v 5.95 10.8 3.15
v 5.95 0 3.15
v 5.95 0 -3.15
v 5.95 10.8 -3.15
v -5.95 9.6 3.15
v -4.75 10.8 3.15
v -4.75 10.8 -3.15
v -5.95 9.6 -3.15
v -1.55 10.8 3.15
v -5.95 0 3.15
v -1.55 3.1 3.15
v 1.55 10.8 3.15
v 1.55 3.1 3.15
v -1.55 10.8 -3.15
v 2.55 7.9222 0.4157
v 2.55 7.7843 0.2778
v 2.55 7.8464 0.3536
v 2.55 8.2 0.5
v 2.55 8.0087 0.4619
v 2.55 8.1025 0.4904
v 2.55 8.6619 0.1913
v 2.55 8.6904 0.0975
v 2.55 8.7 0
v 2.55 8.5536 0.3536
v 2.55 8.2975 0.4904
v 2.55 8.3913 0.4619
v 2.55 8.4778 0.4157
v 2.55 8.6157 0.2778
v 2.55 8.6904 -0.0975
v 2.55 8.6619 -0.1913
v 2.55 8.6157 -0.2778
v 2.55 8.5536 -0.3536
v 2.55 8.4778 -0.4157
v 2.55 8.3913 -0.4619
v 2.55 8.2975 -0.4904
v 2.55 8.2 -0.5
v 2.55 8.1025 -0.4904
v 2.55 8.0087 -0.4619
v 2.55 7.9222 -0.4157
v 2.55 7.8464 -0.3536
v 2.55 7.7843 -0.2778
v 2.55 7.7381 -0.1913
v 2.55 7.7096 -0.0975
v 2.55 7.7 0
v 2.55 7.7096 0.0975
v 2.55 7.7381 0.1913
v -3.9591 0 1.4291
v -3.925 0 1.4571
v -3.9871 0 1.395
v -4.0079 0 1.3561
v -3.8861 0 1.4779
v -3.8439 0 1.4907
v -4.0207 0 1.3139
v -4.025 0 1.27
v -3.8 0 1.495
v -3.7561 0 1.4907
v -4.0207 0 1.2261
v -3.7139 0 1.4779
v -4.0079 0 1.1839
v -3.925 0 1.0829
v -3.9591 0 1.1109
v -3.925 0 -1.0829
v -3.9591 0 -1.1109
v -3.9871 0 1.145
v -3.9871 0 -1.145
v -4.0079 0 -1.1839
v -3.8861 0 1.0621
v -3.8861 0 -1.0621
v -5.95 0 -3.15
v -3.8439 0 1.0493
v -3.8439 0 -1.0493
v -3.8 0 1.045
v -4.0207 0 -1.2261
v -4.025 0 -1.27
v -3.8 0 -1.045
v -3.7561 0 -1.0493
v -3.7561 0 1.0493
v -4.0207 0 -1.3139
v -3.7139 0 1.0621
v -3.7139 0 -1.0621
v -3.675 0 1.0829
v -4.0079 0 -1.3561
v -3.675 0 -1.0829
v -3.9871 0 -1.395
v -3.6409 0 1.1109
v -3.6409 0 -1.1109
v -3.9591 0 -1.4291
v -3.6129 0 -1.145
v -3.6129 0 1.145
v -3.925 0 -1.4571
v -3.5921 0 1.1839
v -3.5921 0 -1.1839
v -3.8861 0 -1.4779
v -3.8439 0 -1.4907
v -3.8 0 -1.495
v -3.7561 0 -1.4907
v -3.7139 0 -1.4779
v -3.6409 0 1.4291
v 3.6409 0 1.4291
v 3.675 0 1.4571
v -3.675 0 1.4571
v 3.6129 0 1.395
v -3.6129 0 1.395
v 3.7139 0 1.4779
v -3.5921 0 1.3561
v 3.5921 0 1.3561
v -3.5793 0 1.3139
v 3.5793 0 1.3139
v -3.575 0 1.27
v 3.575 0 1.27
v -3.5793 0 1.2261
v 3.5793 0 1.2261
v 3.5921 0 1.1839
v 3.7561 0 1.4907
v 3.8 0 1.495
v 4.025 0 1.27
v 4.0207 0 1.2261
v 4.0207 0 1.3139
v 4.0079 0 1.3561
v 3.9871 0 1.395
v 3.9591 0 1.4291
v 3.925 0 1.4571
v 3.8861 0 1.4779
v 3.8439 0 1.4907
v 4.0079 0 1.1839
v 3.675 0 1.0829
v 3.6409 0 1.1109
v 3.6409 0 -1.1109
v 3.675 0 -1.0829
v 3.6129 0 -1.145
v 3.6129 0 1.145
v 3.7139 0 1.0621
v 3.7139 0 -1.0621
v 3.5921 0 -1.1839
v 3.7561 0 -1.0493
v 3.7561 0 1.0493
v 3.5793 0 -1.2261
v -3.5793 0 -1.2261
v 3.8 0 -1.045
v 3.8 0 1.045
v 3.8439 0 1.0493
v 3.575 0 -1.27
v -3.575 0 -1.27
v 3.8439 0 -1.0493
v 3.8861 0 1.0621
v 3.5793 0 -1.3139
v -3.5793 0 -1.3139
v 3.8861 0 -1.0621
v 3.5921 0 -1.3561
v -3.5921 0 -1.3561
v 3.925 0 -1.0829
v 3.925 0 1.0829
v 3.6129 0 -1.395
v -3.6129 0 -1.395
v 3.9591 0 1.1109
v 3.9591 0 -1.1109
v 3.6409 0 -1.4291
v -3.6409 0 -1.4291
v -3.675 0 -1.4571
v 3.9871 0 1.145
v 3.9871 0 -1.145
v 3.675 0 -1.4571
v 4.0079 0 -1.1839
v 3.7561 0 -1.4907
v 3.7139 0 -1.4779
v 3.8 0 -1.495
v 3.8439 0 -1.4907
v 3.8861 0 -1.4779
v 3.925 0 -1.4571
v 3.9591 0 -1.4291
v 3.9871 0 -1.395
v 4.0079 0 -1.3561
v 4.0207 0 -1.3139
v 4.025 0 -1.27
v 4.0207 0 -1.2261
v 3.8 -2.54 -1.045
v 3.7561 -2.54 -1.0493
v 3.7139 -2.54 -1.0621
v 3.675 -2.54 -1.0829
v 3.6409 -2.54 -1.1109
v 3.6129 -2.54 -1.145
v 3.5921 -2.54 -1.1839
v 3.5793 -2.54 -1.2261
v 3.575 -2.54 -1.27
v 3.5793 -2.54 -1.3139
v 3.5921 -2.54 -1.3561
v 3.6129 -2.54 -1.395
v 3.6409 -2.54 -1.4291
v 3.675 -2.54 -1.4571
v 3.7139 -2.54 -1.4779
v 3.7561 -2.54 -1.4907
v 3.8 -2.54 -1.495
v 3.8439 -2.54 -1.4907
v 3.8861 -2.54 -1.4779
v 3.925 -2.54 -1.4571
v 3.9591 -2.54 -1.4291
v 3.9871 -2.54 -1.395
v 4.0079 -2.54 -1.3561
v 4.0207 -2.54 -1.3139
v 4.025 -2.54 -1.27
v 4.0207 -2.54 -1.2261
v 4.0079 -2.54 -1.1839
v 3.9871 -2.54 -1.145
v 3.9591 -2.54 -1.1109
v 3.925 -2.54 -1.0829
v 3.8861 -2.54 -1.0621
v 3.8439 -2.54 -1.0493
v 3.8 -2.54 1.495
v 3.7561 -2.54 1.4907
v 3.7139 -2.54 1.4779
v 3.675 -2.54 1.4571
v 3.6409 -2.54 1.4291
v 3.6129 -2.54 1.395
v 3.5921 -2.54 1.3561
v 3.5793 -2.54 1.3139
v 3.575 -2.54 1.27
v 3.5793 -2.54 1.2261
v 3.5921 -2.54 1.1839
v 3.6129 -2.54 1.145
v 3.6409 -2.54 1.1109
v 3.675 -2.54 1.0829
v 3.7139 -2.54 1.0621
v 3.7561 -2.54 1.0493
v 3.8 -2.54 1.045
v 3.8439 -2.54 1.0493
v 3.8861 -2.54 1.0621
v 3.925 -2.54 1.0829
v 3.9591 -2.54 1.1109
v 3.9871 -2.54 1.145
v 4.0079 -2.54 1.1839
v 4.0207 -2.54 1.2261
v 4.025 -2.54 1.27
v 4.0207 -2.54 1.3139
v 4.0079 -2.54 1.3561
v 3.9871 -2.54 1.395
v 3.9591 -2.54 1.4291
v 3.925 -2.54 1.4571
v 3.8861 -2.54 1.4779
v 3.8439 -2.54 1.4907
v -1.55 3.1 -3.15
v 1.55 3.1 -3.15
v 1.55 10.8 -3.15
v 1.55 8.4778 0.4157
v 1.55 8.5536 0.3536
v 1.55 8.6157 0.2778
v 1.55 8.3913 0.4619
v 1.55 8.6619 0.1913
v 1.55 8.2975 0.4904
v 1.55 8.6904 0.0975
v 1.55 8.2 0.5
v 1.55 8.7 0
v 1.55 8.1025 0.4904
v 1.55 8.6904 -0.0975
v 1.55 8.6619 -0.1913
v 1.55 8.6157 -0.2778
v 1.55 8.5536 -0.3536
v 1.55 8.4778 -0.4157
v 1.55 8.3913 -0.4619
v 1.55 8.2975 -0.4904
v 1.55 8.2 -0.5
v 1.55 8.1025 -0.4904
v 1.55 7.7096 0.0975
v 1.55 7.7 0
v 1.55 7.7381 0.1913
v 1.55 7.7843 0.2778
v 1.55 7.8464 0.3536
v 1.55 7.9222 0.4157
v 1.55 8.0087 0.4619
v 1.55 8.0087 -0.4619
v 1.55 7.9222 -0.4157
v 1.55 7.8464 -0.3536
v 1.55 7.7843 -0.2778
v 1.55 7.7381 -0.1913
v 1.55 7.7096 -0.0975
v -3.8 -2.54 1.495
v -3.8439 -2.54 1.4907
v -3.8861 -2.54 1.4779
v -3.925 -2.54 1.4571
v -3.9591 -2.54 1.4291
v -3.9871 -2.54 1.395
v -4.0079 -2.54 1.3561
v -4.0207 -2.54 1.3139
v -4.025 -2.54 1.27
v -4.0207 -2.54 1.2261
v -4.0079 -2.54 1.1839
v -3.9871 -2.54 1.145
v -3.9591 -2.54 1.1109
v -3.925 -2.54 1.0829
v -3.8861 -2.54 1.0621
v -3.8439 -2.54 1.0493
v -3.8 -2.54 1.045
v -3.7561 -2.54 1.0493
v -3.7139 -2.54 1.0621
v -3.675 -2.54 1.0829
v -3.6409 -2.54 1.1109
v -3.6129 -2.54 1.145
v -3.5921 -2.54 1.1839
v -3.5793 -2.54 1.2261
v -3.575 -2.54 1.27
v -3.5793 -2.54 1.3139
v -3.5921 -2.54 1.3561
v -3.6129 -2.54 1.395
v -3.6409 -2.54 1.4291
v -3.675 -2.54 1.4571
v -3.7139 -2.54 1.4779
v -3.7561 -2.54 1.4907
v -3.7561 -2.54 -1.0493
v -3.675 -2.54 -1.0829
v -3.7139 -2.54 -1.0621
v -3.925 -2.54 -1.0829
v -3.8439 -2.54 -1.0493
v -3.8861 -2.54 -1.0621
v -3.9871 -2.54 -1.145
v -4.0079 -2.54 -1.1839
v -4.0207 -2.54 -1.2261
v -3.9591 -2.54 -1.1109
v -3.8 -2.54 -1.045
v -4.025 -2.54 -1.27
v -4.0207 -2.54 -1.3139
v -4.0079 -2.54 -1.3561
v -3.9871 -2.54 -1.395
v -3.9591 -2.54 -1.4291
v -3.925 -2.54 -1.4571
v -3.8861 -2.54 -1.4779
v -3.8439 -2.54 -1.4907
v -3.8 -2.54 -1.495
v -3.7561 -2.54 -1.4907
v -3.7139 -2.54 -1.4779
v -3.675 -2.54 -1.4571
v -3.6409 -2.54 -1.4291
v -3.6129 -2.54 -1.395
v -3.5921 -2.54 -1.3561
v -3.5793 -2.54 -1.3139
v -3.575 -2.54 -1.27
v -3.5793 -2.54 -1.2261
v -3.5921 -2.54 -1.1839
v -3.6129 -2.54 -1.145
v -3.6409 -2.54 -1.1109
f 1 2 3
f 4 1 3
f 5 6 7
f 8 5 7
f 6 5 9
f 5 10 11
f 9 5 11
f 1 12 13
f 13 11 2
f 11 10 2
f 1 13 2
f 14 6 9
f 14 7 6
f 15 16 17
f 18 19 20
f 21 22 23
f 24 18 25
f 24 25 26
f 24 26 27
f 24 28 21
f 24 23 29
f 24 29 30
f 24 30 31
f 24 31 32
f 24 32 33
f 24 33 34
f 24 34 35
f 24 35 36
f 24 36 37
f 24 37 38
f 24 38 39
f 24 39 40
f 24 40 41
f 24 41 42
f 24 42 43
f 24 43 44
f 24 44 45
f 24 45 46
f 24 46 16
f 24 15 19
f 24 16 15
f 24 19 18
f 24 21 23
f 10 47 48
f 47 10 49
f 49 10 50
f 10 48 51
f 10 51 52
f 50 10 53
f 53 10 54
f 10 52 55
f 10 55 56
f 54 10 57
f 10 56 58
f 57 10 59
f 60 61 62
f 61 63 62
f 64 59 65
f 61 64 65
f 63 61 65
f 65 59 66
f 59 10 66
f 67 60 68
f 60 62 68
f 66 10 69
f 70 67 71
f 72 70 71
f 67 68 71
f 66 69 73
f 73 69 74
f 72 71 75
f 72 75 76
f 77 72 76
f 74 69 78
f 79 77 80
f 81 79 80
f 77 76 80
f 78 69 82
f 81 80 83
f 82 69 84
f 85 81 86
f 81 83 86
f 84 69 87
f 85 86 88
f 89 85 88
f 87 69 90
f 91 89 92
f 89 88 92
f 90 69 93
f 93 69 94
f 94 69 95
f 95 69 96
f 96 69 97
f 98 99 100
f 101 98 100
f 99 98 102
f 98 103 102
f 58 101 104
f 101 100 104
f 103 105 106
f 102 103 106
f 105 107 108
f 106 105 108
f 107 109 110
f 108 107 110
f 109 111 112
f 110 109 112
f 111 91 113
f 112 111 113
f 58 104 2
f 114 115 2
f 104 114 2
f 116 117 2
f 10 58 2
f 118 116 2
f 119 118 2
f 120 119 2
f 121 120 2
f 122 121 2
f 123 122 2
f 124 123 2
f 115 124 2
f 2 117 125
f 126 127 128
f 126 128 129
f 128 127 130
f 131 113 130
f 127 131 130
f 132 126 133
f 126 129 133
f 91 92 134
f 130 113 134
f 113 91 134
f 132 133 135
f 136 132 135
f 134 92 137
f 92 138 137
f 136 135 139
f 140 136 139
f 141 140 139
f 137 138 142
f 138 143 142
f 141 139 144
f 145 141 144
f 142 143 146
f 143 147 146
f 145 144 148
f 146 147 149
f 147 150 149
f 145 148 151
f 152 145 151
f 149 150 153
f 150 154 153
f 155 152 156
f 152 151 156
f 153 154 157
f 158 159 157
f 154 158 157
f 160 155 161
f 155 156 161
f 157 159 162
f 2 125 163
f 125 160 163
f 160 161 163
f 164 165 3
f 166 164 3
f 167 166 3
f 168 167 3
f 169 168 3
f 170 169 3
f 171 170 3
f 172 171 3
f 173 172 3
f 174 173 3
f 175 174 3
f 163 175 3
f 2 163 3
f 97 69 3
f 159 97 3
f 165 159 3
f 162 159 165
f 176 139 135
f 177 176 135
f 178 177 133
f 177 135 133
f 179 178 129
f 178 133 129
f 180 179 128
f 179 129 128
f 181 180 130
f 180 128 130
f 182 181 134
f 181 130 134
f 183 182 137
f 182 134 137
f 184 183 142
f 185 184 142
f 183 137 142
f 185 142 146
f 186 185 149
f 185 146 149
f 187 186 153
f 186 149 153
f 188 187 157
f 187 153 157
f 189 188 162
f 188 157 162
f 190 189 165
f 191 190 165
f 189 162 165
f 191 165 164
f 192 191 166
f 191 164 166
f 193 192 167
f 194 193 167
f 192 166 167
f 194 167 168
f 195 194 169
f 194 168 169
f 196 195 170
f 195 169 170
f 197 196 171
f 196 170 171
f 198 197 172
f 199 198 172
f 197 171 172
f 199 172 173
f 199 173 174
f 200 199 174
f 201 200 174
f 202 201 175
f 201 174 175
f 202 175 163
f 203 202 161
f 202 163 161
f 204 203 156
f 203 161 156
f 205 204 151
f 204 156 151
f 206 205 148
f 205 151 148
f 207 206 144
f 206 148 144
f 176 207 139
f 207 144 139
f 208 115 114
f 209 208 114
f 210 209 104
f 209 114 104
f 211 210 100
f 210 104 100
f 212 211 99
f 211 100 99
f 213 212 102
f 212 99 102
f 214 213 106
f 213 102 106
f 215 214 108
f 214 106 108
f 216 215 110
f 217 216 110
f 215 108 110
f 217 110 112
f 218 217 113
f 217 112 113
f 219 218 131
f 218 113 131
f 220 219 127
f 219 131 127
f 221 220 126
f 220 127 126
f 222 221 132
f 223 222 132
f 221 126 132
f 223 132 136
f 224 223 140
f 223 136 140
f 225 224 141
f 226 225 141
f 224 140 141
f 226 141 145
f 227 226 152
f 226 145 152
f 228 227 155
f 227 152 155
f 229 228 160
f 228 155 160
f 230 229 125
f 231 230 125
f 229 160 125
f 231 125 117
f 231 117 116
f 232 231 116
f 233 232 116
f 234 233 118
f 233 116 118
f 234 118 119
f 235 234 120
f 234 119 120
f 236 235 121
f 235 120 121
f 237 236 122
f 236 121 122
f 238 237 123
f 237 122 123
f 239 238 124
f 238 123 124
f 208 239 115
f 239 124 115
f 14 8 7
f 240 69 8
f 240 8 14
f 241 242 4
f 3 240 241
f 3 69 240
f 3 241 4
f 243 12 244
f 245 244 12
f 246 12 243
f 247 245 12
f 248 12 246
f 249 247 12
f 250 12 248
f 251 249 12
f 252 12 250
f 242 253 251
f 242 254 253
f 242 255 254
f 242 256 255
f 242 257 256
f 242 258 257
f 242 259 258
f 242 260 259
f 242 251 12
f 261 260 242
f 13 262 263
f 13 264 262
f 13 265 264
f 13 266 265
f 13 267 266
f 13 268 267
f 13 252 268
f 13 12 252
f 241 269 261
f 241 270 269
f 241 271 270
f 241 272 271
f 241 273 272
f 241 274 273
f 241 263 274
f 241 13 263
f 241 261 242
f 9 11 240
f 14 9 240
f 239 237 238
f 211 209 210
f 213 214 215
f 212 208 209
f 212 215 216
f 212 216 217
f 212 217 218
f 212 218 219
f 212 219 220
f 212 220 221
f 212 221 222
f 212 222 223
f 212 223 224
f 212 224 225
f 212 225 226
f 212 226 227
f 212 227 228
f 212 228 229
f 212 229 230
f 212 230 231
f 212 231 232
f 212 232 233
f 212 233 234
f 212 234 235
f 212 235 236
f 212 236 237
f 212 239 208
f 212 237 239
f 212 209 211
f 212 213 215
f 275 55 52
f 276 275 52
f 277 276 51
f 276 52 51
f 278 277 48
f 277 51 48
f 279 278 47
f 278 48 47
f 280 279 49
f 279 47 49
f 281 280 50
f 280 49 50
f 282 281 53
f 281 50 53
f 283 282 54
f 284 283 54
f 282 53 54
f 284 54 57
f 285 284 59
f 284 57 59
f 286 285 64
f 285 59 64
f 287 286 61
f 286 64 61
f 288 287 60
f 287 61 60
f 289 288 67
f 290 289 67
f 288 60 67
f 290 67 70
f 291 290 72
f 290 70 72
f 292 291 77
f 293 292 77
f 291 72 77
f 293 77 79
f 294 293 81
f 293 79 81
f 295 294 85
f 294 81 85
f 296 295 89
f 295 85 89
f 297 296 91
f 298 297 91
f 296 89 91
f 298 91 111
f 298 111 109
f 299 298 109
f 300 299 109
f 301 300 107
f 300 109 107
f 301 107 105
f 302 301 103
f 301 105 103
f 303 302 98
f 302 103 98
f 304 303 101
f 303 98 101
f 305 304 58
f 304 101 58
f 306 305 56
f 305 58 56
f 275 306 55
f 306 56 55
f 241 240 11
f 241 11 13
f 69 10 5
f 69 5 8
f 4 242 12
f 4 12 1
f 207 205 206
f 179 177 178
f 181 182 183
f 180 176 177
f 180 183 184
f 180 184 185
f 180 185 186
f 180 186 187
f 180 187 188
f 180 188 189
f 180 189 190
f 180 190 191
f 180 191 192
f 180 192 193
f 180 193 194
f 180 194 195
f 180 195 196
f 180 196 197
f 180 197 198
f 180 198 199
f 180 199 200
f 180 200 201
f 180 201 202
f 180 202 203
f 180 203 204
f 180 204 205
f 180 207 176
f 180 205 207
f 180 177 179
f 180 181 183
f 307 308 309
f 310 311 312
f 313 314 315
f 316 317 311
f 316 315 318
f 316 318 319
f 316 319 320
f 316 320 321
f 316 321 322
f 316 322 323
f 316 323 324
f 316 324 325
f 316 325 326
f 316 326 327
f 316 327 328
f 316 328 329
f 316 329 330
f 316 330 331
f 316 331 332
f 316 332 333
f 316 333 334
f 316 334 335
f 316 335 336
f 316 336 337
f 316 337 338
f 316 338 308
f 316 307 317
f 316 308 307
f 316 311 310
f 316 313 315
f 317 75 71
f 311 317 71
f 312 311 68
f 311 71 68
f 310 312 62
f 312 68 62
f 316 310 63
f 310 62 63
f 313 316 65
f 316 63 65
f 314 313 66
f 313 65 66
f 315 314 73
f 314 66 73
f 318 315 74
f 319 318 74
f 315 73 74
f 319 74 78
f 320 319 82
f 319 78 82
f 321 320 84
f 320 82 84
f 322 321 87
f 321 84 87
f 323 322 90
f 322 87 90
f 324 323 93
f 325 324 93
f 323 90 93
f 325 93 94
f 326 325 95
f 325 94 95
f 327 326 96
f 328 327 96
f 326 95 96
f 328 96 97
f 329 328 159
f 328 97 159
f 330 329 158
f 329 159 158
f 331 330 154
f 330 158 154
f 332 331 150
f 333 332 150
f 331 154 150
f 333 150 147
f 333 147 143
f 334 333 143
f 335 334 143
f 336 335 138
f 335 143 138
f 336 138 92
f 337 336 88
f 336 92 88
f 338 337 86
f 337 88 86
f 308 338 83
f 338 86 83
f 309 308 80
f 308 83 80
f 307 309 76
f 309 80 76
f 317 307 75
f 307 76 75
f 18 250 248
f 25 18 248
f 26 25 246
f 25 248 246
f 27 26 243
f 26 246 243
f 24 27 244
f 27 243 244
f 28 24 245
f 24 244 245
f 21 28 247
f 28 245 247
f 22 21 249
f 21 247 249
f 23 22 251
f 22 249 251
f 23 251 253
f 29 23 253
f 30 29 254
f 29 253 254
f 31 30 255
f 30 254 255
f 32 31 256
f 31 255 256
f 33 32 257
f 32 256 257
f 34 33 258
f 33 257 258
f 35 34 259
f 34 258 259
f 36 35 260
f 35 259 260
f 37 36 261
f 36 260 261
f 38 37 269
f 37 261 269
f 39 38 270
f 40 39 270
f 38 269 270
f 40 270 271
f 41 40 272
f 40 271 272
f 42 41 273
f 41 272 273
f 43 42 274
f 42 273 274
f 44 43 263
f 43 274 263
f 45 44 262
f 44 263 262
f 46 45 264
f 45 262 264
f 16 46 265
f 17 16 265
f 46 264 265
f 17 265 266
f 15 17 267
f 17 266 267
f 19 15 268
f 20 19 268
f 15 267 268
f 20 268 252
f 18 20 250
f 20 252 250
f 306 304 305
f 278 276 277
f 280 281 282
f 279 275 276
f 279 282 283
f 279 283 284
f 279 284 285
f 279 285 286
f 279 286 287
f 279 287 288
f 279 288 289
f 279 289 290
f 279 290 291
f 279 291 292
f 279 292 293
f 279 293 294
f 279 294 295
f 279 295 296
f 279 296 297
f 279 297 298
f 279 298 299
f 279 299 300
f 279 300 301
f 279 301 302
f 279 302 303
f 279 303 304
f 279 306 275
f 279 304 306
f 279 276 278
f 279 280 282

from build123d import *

# Parameters (mm, degrees)
SKETCH1_W           = 11.9
SKETCH1_H           = 6.3
BOSS_EXTRUDE1_DEPTH = 3.1
SKETCH2_W           = 4.4
SKETCH2_H           = 6.3
BOSS_EXTRUDE2_DEPTH = 7.7
SKETCH3_R           = 0.5
CUT_EXTRUDE1_DEPTH  = 1
CHAMFER1_SIZE       = 1.2
SKETCH4_R           = 0.225
BOSS_EXTRUDE3_DEPTH = 2.54


with BuildPart() as part:
    # Sketch1 → Boss-Extrude1 (new body)
    with BuildSketch(Plane(origin=(0, 0, 0), x_dir=(1, 0, 0), z_dir=(0, 1, 0))):
        Rectangle(SKETCH1_W, SKETCH1_H)
    extrude(amount=BOSS_EXTRUDE1_DEPTH)

    # Sketch2 → Boss-Extrude2 (add)
    with BuildSketch(Plane(origin=(0, 3.1, 0), x_dir=(1, 0, 0), z_dir=(0, 1, 0))):
        with Locations((-3.75, 0)):
            Rectangle(SKETCH2_W, SKETCH2_H)
        with Locations((3.75, 0)):
            Rectangle(SKETCH2_W, SKETCH2_H)
    extrude(amount=BOSS_EXTRUDE2_DEPTH)

    # Sketch3 → Cut-Extrude1 (cut)
    with BuildSketch(Plane.ZY.offset(-1.55)):
        with Locations((0, 8.2)):
            Circle(SKETCH3_R)
    extrude(amount=-CUT_EXTRUDE1_DEPTH, mode=Mode.SUBTRACT)

    # Chamfer1
    chamfer1_edges = [part.edges().sort_by_distance(p)[0] for p in [
        (-5.95, 10.8, 0),
    ]]
    chamfer(chamfer1_edges, length=CHAMFER1_SIZE)

    # Sketch4 → Boss-Extrude3 (add)
    with BuildSketch(Plane.XZ):
        with Locations(Location((-3.8, 1.27, 0), (0, 0, 90))):
            Circle(SKETCH4_R)
        with Locations(Location((-3.8, -1.27, 0), (0, 0, 90))):
            Circle(SKETCH4_R)
        with Locations(Location((3.8, 1.27, 0), (0, 0, 90))):
            Circle(SKETCH4_R)
        with Locations(Location((3.8, -1.27, 0), (0, 0, 90))):
            Circle(SKETCH4_R)
    extrude(amount=BOSS_EXTRUDE3_DEPTH)


solid = part.part
